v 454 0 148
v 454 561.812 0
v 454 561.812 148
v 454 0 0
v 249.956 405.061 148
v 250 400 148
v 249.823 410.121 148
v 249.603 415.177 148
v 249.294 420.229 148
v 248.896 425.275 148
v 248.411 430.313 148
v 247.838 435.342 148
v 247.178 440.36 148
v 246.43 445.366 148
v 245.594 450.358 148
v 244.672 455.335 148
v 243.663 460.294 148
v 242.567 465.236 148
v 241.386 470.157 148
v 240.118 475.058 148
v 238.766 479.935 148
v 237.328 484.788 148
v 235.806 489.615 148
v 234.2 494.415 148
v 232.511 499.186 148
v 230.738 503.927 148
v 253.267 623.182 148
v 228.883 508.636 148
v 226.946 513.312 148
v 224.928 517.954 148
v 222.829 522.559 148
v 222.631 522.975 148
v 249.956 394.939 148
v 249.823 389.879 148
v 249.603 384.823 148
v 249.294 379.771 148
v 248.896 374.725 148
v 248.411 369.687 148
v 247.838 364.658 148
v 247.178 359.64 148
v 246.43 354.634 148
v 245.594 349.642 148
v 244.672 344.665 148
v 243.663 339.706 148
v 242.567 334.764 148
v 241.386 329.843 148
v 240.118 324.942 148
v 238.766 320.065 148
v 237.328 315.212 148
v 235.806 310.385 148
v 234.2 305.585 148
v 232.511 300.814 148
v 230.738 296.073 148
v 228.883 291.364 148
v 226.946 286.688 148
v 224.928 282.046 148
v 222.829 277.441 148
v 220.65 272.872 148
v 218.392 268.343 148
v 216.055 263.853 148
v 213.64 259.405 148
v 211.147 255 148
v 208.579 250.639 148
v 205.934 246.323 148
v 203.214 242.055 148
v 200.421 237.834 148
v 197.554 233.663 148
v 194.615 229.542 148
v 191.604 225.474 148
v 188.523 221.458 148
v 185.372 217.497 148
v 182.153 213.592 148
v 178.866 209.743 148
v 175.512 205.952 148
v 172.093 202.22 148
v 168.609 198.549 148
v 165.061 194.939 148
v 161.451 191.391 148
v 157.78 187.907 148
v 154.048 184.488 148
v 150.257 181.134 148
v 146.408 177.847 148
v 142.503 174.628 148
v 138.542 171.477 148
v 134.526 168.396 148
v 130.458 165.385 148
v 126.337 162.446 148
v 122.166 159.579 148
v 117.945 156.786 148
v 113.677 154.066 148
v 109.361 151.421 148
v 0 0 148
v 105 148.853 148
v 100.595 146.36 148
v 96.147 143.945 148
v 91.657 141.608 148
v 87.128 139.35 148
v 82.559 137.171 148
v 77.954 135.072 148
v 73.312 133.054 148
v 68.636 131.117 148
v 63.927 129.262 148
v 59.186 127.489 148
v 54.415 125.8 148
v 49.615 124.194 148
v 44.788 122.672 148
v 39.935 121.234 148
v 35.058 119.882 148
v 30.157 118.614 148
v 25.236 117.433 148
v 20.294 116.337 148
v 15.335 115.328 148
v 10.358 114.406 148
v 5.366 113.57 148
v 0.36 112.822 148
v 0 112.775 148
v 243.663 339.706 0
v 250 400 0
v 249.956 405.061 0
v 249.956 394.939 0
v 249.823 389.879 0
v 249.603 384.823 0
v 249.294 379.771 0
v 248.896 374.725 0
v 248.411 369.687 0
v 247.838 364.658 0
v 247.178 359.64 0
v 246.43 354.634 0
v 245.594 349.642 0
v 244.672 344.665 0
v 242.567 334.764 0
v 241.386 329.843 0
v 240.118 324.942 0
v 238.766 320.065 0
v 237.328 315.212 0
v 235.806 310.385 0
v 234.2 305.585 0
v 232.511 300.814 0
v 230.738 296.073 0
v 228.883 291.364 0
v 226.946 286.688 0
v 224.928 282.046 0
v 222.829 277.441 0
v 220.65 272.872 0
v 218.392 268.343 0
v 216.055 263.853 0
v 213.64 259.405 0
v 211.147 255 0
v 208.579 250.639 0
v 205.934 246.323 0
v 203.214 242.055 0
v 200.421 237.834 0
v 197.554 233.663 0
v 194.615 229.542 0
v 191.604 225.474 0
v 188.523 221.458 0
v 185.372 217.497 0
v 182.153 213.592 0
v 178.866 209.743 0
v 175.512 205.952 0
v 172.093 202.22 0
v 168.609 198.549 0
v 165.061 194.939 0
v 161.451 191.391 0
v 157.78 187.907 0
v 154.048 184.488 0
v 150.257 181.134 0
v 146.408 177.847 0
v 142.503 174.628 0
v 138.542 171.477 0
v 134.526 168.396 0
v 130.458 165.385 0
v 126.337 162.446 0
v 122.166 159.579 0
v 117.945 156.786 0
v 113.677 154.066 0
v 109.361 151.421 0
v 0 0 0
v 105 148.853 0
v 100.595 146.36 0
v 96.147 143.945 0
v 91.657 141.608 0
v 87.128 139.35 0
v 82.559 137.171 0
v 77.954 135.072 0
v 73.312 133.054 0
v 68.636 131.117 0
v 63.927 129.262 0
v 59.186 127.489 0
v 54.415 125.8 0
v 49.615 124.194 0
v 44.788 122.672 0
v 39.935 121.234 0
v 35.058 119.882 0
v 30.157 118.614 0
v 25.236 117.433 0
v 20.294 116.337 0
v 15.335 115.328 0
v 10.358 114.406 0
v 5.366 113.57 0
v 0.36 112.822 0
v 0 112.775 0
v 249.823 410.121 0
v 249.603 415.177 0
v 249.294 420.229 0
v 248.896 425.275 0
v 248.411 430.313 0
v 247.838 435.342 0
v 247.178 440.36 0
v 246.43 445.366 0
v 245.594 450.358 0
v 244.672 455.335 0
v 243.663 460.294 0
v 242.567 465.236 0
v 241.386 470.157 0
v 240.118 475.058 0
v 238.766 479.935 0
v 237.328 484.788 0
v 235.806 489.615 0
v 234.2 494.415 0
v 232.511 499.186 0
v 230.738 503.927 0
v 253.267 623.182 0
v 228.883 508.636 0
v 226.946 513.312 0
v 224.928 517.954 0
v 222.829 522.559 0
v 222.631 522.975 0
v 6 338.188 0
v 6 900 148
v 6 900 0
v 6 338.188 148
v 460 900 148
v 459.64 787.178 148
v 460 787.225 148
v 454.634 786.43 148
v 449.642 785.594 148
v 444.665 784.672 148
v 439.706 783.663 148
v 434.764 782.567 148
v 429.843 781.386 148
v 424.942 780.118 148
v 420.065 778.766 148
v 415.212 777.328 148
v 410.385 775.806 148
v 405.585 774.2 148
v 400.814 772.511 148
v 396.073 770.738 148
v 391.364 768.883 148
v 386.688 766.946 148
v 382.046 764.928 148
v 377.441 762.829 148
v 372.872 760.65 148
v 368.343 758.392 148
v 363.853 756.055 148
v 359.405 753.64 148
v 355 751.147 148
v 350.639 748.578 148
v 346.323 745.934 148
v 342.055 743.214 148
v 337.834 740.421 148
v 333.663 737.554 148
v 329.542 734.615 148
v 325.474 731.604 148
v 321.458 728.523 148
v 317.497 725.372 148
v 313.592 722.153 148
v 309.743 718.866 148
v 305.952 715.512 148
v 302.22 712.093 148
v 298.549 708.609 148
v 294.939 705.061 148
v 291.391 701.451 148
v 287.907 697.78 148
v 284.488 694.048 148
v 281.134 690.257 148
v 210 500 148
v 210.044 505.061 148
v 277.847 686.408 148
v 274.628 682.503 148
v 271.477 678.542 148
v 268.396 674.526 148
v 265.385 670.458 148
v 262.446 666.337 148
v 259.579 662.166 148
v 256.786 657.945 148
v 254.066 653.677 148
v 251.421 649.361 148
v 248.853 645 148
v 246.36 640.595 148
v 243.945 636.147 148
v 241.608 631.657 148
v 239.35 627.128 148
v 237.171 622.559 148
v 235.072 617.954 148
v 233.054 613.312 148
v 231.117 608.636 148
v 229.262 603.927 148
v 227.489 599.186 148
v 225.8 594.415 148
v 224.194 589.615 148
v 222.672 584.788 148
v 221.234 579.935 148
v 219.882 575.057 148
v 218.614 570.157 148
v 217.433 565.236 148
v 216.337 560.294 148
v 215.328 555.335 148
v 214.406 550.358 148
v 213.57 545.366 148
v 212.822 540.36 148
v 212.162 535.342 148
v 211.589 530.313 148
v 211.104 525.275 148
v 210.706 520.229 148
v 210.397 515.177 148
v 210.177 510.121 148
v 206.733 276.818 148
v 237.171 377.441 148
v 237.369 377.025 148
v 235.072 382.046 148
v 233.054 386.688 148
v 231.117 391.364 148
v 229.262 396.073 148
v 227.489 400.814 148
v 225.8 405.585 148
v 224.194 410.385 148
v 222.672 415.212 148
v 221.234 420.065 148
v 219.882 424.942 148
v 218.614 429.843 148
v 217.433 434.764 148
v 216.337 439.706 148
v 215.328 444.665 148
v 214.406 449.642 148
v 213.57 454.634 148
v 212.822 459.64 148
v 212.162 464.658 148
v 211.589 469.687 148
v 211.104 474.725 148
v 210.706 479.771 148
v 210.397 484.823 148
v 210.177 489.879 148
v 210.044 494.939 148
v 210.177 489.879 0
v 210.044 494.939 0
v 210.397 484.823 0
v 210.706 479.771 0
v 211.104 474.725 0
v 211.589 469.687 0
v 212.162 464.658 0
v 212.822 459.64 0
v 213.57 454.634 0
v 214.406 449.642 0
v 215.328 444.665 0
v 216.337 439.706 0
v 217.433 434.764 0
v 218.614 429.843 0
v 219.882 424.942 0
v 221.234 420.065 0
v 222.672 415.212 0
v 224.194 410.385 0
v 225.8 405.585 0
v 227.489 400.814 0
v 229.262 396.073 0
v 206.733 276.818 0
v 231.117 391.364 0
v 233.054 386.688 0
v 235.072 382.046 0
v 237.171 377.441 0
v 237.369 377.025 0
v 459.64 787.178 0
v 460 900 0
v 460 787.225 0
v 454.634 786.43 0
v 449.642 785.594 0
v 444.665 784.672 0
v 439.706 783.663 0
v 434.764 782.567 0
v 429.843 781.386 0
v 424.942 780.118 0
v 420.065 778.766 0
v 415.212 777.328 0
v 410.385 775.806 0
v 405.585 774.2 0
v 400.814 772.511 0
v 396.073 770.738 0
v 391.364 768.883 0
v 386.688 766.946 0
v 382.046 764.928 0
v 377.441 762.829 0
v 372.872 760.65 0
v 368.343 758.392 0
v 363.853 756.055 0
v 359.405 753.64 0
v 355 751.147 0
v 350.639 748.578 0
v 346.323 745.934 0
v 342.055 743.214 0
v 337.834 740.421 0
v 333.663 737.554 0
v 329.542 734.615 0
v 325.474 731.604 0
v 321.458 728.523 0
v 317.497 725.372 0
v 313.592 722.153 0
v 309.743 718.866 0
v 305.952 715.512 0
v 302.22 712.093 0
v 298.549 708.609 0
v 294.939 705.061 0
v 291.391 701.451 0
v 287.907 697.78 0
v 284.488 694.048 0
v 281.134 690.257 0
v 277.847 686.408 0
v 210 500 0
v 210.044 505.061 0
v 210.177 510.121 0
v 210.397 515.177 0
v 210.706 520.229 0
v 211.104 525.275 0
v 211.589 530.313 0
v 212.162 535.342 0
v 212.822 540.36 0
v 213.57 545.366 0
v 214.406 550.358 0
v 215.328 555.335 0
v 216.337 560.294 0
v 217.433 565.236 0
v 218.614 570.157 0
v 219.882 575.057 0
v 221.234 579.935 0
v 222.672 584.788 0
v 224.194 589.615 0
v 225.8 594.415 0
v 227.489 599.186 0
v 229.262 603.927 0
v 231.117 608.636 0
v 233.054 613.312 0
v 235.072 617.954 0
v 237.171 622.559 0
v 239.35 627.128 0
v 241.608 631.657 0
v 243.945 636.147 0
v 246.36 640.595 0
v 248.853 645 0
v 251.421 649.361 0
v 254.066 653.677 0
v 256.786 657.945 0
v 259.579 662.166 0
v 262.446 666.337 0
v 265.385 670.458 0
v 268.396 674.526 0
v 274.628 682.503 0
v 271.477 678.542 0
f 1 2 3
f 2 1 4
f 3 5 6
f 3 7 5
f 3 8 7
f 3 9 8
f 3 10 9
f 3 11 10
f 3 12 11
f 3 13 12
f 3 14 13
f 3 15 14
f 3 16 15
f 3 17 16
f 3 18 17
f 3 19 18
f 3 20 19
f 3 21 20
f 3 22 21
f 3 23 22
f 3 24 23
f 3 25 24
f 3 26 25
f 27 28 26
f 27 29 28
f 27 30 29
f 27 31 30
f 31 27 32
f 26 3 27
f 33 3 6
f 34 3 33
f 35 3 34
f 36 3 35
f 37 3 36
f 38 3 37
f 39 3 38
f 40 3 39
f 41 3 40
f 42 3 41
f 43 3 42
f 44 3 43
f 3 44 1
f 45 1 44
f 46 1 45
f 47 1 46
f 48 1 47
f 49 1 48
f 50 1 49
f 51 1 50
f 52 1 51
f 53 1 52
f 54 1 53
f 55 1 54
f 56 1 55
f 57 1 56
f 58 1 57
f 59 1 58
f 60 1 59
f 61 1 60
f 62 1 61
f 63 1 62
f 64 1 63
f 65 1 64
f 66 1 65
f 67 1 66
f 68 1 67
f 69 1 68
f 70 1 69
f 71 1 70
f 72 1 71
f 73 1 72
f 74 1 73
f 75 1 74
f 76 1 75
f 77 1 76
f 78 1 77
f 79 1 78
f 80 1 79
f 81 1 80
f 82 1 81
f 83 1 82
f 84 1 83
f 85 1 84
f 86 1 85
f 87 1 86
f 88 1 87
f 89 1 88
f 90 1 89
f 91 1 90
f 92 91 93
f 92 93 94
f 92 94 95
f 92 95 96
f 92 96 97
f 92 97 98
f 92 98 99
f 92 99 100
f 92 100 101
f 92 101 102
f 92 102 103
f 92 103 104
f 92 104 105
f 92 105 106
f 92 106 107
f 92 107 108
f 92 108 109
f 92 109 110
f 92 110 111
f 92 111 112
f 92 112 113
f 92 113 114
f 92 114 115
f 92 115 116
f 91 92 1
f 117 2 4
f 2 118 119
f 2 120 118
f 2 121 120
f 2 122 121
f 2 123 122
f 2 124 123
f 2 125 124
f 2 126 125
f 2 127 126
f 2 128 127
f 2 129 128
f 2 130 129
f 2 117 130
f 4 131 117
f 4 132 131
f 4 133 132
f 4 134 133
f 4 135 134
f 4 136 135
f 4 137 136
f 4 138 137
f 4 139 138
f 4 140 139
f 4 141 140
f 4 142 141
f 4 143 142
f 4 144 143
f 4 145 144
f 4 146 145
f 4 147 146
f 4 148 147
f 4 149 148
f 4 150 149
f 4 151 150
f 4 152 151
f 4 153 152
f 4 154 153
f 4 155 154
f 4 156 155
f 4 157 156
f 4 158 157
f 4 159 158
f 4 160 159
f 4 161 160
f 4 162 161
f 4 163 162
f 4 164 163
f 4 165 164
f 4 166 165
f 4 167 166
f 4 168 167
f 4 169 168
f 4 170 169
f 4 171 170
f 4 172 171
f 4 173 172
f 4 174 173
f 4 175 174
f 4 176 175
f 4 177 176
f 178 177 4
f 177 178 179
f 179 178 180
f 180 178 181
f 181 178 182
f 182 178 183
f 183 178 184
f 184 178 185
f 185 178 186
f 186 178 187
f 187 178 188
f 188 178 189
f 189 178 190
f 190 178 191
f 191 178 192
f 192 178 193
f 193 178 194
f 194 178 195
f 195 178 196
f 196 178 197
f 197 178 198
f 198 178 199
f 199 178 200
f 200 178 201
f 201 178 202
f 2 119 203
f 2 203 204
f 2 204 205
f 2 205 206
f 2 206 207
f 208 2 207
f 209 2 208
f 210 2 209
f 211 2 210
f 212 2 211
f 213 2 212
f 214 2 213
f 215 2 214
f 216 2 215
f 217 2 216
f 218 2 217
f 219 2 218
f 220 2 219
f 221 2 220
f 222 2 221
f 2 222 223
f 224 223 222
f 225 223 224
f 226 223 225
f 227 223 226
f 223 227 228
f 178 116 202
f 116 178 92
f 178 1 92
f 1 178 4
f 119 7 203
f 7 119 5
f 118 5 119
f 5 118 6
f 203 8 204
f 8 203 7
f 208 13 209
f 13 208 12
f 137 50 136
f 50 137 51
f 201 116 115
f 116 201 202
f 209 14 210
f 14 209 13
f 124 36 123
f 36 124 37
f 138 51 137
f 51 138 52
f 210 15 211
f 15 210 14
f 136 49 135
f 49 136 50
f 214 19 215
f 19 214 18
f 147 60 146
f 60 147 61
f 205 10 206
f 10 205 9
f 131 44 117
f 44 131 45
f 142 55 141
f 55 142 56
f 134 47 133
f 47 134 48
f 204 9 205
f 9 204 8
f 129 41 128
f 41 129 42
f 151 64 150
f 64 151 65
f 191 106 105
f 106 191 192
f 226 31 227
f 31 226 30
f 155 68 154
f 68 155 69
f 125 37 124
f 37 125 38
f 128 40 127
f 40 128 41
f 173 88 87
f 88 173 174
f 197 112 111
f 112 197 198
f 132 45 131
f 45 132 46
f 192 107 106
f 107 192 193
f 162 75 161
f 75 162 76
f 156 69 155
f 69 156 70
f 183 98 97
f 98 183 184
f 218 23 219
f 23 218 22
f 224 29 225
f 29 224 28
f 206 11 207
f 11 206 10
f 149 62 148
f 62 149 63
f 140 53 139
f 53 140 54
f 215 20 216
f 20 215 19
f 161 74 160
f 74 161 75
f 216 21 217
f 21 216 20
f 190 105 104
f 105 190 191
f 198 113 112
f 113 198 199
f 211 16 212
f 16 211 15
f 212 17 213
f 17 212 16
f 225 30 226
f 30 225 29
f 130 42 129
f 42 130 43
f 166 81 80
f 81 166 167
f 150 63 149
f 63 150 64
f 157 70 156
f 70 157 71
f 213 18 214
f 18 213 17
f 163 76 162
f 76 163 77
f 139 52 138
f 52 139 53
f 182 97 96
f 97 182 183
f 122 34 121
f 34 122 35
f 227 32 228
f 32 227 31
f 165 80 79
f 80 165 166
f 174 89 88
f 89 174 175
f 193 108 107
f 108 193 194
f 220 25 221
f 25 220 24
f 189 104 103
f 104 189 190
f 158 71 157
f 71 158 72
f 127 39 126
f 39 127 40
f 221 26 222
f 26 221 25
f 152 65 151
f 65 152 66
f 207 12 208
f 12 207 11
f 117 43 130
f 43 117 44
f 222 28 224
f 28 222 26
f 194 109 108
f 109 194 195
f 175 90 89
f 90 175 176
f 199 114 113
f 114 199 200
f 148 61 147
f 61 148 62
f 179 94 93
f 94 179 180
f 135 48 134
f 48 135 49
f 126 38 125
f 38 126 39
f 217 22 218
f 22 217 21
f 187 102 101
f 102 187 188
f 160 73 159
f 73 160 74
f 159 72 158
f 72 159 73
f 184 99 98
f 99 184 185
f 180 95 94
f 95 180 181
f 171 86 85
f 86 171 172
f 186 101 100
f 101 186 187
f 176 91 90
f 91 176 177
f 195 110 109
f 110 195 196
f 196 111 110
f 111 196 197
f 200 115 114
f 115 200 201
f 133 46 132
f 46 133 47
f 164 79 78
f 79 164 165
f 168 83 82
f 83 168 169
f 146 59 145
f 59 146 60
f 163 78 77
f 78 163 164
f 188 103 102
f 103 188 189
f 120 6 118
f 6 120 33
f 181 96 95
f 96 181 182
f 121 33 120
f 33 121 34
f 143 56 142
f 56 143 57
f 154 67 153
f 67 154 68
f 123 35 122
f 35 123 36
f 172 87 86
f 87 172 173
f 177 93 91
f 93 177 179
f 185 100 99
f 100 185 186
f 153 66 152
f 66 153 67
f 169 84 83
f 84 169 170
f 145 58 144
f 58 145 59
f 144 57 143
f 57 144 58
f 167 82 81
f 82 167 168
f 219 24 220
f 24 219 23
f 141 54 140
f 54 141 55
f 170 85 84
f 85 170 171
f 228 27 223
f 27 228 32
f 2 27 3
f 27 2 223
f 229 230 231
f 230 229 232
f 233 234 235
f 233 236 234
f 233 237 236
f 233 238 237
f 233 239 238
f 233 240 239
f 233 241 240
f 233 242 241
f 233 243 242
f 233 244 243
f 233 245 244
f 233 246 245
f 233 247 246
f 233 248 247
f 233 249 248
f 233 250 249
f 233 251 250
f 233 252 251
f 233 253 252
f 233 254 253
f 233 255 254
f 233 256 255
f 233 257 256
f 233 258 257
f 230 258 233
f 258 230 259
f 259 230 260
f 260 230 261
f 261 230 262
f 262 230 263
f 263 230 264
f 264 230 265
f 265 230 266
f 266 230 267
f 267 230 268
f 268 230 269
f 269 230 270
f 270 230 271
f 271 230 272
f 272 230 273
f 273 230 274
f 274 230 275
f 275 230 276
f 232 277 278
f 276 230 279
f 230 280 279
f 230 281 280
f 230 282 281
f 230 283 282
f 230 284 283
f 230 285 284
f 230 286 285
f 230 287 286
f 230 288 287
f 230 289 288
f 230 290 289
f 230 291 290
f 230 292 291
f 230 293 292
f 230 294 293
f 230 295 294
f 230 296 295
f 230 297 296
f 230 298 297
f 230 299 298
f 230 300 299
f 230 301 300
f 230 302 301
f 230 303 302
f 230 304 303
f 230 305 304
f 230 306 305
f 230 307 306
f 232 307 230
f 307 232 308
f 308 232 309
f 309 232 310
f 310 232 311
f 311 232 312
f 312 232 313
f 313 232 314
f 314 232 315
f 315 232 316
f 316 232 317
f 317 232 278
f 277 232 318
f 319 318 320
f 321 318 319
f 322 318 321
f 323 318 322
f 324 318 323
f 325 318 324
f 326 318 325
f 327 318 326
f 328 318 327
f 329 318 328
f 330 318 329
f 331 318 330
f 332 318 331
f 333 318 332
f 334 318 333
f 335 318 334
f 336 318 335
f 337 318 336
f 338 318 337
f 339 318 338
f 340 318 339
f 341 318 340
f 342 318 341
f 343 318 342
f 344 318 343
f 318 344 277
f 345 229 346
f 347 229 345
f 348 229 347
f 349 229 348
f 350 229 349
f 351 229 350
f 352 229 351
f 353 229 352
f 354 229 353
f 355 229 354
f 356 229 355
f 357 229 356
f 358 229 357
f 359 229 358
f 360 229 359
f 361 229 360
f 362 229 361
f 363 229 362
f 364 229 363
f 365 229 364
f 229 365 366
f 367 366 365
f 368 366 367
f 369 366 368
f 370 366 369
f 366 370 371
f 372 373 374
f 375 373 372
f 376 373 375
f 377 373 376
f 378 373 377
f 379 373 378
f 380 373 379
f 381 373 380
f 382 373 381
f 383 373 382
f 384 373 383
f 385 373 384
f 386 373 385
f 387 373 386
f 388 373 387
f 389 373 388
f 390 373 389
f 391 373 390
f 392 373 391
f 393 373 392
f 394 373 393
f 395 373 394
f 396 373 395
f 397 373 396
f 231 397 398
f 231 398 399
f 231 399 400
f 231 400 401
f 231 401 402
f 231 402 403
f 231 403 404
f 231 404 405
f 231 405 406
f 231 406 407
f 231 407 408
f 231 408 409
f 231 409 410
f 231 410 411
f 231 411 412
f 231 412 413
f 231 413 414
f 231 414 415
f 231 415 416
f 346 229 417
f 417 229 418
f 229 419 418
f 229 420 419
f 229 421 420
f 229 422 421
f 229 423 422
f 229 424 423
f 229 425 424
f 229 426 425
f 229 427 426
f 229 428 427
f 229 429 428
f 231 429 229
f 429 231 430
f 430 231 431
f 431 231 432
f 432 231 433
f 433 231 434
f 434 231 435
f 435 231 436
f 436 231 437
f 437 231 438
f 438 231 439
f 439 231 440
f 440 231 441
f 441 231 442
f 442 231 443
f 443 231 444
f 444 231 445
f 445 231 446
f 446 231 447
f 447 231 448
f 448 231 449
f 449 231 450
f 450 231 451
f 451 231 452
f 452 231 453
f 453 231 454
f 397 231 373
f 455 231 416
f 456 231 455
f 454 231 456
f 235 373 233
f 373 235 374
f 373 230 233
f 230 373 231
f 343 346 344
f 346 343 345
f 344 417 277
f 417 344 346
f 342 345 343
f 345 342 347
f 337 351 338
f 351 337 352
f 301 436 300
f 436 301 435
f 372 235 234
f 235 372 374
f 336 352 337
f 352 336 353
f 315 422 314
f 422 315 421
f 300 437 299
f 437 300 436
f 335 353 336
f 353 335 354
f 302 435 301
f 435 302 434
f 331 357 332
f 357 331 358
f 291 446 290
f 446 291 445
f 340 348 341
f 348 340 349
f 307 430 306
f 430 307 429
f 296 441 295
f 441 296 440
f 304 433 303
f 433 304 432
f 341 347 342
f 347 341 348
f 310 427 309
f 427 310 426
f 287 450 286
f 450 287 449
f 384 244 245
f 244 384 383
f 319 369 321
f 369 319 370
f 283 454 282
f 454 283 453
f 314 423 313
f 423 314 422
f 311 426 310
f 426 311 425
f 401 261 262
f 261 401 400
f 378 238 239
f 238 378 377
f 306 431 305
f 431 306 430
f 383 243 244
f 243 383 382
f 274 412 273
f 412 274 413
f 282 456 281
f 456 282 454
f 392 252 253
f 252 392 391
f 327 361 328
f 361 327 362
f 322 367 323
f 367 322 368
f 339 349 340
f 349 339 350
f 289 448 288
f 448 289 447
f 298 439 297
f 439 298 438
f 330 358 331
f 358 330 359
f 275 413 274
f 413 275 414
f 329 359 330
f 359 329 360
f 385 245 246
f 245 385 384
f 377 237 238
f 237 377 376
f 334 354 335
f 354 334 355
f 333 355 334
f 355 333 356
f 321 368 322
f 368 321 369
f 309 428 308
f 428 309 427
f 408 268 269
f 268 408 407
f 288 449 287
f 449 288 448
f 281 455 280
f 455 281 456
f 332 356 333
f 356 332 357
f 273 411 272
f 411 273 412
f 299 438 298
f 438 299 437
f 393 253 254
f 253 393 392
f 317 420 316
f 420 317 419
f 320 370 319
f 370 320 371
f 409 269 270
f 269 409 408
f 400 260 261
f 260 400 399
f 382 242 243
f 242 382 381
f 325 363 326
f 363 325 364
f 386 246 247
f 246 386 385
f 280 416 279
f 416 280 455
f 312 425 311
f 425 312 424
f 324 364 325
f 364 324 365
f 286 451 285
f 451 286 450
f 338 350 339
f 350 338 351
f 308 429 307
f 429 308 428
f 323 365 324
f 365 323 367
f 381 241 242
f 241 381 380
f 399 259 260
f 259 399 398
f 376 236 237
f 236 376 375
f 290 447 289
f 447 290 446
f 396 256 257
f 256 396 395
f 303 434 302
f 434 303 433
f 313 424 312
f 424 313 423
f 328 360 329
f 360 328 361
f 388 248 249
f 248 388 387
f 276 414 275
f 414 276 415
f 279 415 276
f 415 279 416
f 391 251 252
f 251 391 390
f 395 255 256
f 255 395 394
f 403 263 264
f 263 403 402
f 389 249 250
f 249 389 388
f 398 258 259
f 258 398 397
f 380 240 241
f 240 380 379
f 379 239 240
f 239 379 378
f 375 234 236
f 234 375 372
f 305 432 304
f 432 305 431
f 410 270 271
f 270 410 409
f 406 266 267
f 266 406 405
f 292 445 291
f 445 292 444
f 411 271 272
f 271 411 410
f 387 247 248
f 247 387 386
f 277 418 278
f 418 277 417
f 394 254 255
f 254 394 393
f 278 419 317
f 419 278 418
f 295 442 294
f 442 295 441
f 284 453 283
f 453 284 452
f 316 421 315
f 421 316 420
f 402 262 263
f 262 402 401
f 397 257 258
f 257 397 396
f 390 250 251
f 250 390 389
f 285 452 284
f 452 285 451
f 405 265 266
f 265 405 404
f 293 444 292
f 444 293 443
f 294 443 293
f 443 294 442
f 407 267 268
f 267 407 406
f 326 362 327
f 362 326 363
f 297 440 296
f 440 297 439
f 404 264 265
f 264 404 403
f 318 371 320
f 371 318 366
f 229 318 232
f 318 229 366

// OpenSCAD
$fn=360;
side_w = 14.8;
w2 = 1; //10 mm

display_w = 34.5;
display_h = 28;
machine_w = 40;

module side()  {
rad = 29;
eps = 0.01;
difference(){
    cube([ 45.4,63.5,side_w]);
    translate([-4,rad+11,-eps]) cylinder(side_w+2*eps,rad,rad,[0,0,0]);
    rotate([0,0,-17])translate([-29,30,-eps])cube([35,80,side_w+2*eps]);
    rotate([0,0,-17])translate([-27,67,-eps])cube([80,20,side_w+2*eps]);
    }
}
//projection(cut = false)
{
  scale([10,10,10]) {
    side();
    translate([46, 90,0]) rotate([0,0,180])  side();
  }
}
